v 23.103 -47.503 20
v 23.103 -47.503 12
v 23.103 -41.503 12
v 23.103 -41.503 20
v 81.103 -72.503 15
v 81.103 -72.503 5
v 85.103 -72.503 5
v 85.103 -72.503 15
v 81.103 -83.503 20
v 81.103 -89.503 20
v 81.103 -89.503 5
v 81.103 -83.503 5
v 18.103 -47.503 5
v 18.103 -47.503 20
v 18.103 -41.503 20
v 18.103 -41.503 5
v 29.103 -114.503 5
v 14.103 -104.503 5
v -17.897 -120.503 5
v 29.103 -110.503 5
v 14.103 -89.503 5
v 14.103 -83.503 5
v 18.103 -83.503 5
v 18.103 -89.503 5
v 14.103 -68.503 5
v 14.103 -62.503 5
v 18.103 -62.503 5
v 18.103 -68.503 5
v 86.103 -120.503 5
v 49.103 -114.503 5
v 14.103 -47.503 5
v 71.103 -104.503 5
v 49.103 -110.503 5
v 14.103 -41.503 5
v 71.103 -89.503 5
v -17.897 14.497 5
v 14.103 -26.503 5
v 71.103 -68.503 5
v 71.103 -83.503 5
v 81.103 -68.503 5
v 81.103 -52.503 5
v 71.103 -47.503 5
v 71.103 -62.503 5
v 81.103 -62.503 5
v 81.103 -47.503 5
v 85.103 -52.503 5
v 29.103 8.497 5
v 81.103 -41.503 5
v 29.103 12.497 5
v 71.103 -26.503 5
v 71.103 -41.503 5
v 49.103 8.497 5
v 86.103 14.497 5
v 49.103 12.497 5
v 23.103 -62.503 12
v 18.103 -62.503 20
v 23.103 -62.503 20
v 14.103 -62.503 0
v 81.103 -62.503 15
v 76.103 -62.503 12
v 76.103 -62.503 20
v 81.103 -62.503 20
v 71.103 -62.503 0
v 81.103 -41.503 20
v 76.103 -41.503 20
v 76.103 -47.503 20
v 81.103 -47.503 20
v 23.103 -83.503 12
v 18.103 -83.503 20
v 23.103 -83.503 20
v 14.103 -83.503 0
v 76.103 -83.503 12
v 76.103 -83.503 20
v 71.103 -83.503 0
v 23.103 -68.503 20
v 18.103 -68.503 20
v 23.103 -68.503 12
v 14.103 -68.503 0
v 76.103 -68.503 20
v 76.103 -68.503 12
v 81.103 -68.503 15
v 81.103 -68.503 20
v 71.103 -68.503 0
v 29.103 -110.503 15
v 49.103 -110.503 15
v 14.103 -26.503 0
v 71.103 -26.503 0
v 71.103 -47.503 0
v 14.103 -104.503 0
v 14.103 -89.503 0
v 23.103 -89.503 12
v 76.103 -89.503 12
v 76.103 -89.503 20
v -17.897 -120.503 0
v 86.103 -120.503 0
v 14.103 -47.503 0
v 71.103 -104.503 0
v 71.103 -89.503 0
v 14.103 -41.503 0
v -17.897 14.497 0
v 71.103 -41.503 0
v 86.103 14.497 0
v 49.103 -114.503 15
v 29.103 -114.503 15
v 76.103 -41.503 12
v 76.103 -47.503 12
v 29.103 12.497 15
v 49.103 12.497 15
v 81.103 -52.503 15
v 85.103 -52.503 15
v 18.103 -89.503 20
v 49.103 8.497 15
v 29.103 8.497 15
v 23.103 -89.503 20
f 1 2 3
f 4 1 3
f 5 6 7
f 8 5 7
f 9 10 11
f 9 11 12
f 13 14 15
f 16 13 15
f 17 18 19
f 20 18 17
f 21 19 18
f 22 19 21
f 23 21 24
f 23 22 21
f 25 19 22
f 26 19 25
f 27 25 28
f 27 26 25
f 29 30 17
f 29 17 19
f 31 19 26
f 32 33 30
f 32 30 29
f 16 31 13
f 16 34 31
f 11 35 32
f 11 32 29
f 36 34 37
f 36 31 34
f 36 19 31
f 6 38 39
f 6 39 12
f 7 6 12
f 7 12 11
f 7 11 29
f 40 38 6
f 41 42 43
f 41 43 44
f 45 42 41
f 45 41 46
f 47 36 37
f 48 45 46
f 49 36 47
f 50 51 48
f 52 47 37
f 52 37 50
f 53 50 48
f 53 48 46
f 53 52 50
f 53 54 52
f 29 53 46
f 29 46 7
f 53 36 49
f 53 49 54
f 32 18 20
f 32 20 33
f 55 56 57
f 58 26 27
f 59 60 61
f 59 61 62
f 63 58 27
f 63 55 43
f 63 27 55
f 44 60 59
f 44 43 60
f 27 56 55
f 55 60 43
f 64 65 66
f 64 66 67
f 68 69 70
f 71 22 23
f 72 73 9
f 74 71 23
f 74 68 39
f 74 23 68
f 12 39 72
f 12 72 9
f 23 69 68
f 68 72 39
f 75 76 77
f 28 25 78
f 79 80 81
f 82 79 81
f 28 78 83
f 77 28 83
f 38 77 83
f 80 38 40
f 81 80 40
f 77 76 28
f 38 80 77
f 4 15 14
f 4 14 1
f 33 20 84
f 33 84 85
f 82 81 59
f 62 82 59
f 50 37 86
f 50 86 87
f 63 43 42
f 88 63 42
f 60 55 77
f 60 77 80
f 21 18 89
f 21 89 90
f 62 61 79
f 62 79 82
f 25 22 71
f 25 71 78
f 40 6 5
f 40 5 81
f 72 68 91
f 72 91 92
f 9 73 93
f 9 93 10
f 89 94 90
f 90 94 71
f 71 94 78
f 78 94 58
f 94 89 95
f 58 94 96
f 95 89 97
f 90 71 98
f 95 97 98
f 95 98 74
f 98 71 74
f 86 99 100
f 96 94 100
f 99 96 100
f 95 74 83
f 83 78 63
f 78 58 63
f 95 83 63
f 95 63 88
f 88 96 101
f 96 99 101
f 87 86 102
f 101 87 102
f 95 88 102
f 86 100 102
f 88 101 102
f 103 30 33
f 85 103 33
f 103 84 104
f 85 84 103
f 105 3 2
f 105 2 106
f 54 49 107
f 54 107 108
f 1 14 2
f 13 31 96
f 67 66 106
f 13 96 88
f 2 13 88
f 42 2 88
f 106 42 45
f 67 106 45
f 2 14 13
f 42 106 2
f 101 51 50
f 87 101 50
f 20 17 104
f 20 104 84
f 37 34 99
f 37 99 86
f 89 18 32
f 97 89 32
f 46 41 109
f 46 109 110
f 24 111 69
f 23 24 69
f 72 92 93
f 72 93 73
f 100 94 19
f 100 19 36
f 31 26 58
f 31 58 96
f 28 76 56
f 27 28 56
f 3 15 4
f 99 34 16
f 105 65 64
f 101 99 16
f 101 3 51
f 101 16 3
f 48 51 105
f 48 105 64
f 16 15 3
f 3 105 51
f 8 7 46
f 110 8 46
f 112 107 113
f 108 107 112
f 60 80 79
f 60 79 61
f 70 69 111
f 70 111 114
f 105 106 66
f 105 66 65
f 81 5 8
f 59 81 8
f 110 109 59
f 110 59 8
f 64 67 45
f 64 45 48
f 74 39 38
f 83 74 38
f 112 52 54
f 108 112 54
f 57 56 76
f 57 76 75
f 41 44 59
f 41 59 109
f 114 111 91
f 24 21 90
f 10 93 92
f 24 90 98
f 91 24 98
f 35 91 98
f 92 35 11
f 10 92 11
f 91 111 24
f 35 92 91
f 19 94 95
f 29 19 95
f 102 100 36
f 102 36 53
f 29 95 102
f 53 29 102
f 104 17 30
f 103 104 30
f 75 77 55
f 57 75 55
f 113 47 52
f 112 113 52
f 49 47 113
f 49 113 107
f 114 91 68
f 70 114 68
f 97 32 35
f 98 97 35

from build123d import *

# Parameters (mm, degrees)
SKETCH_1_W          = 104
SKETCH_1_H          = 135
EXTRUDE_2_DEPTH     = 5
SKETCH_2_W          = 20
SKETCH_2_H          = 4
SKETCH_2_W_2        = 4
SKETCH_2_H_2        = 20
EXTRUDE_3_DEPTH     = 10
CUT_EXTRUDE_1_REACH = 7
SKETCH_3_W          = 57
SKETCH_3_H          = 15
SKETCH_4_W          = 5
SKETCH_4_H          = 6
EXTRUDE_4_DEPTH     = 15
SKETCH_6_W          = 53
SKETCH_6_H          = 6
EXTRUDE_5_DEPTH     = 7


with BuildPart() as part:
    # 草圖1 → 填料-伸長2 (new body)
    with BuildSketch(Plane.XY):
        with Locations((34.103184984, -53.003221767)):
            Rectangle(SKETCH_1_W, SKETCH_1_H)
    extrude(amount=EXTRUDE_2_DEPTH)

    # 草圖2 → 填料-伸長3 (add)
    with BuildSketch(Plane.XY.offset(5)):
        with Locations((39.103184984, 10.496778233)):
            Rectangle(SKETCH_2_W, SKETCH_2_H)
        with Locations((39.103184984, -112.503221767)):
            Rectangle(SKETCH_2_W, SKETCH_2_H)
        with Locations((83.103184984, -62.503221767)):
            Rectangle(SKETCH_2_W_2, SKETCH_2_H_2)
    extrude(amount=EXTRUDE_3_DEPTH)

    # 草圖3 → 除料-伸長1 (cut, up to next)
    with BuildSketch(Plane.XY.offset(5), mode=Mode.PRIVATE) as cut_extrude_1_sk1:
        with Locations((42.603184984, -97.003221767)):
            Rectangle(SKETCH_3_W, SKETCH_3_H)
    cut_extrude_1_tool1 = extrude(cut_extrude_1_sk1.sketch, amount=-CUT_EXTRUDE_1_REACH, mode=Mode.PRIVATE) & part.part
    add(cut_extrude_1_tool1.solids().sort_by_distance((42.603185, -97.003222, 5))[0], mode=Mode.SUBTRACT)
    # 草圖3 → 除料-伸長1 (cut, up to next)
    with BuildSketch(Plane.XY.offset(5), mode=Mode.PRIVATE) as cut_extrude_1_sk2:
        with Locations((42.603184984, -76.003221767)):
            Rectangle(SKETCH_3_W, SKETCH_3_H)
    cut_extrude_1_tool2 = extrude(cut_extrude_1_sk2.sketch, amount=-CUT_EXTRUDE_1_REACH, mode=Mode.PRIVATE) & part.part
    add(cut_extrude_1_tool2.solids().sort_by_distance((42.603185, -76.003222, 5))[0], mode=Mode.SUBTRACT)
    # 草圖3 → 除料-伸長1 (cut, up to next)
    with BuildSketch(Plane.XY.offset(5), mode=Mode.PRIVATE) as cut_extrude_1_sk3:
        with Locations((42.603184984, -55.003221767)):
            Rectangle(SKETCH_3_W, SKETCH_3_H)
    cut_extrude_1_tool3 = extrude(cut_extrude_1_sk3.sketch, amount=-CUT_EXTRUDE_1_REACH, mode=Mode.PRIVATE) & part.part
    add(cut_extrude_1_tool3.solids().sort_by_distance((42.603185, -55.003222, 5))[0], mode=Mode.SUBTRACT)
    # 草圖3 → 除料-伸長1 (cut, up to next)
    with BuildSketch(Plane.XY.offset(5), mode=Mode.PRIVATE) as cut_extrude_1_sk4:
        with Locations((42.603184984, -34.003221767)):
            Rectangle(SKETCH_3_W, SKETCH_3_H)
    cut_extrude_1_tool4 = extrude(cut_extrude_1_sk4.sketch, amount=-CUT_EXTRUDE_1_REACH, mode=Mode.PRIVATE) & part.part
    add(cut_extrude_1_tool4.solids().sort_by_distance((42.603185, -34.003222, 5))[0], mode=Mode.SUBTRACT)

    # 草圖4 → 填料-伸長4 (add)
    with BuildSketch(Plane.XY.offset(5)):
        with Locations((20.603184984, -44.503221767)):
            Rectangle(SKETCH_4_W, SKETCH_4_H)
        with Locations((78.603184984, -44.503221767)):
            Rectangle(SKETCH_4_W, SKETCH_4_H)
        with Locations((20.603184984, -65.503221767)):
            Rectangle(SKETCH_4_W, SKETCH_4_H)
        with Locations((78.603184984, -65.503221767)):
            Rectangle(SKETCH_4_W, SKETCH_4_H)
        with Locations((20.603184984, -86.503221767)):
            Rectangle(SKETCH_4_W, SKETCH_4_H)
        with Locations((78.603184984, -86.503221767)):
            Rectangle(SKETCH_4_W, SKETCH_4_H)
    extrude(amount=EXTRUDE_4_DEPTH)

    # 草圖6 → 填料-伸長5 (add)
    with BuildSketch(Plane.XY.offset(5)):
        with Locations((49.603184984, -44.503221767)):
            Rectangle(SKETCH_6_W, SKETCH_6_H)
        with Locations((49.603184984, -65.503221767)):
            Rectangle(SKETCH_6_W, SKETCH_6_H)
        with Locations((49.603184984, -86.503221767)):
            Rectangle(SKETCH_6_W, SKETCH_6_H)
    extrude(amount=EXTRUDE_5_DEPTH)


solid = part.part
